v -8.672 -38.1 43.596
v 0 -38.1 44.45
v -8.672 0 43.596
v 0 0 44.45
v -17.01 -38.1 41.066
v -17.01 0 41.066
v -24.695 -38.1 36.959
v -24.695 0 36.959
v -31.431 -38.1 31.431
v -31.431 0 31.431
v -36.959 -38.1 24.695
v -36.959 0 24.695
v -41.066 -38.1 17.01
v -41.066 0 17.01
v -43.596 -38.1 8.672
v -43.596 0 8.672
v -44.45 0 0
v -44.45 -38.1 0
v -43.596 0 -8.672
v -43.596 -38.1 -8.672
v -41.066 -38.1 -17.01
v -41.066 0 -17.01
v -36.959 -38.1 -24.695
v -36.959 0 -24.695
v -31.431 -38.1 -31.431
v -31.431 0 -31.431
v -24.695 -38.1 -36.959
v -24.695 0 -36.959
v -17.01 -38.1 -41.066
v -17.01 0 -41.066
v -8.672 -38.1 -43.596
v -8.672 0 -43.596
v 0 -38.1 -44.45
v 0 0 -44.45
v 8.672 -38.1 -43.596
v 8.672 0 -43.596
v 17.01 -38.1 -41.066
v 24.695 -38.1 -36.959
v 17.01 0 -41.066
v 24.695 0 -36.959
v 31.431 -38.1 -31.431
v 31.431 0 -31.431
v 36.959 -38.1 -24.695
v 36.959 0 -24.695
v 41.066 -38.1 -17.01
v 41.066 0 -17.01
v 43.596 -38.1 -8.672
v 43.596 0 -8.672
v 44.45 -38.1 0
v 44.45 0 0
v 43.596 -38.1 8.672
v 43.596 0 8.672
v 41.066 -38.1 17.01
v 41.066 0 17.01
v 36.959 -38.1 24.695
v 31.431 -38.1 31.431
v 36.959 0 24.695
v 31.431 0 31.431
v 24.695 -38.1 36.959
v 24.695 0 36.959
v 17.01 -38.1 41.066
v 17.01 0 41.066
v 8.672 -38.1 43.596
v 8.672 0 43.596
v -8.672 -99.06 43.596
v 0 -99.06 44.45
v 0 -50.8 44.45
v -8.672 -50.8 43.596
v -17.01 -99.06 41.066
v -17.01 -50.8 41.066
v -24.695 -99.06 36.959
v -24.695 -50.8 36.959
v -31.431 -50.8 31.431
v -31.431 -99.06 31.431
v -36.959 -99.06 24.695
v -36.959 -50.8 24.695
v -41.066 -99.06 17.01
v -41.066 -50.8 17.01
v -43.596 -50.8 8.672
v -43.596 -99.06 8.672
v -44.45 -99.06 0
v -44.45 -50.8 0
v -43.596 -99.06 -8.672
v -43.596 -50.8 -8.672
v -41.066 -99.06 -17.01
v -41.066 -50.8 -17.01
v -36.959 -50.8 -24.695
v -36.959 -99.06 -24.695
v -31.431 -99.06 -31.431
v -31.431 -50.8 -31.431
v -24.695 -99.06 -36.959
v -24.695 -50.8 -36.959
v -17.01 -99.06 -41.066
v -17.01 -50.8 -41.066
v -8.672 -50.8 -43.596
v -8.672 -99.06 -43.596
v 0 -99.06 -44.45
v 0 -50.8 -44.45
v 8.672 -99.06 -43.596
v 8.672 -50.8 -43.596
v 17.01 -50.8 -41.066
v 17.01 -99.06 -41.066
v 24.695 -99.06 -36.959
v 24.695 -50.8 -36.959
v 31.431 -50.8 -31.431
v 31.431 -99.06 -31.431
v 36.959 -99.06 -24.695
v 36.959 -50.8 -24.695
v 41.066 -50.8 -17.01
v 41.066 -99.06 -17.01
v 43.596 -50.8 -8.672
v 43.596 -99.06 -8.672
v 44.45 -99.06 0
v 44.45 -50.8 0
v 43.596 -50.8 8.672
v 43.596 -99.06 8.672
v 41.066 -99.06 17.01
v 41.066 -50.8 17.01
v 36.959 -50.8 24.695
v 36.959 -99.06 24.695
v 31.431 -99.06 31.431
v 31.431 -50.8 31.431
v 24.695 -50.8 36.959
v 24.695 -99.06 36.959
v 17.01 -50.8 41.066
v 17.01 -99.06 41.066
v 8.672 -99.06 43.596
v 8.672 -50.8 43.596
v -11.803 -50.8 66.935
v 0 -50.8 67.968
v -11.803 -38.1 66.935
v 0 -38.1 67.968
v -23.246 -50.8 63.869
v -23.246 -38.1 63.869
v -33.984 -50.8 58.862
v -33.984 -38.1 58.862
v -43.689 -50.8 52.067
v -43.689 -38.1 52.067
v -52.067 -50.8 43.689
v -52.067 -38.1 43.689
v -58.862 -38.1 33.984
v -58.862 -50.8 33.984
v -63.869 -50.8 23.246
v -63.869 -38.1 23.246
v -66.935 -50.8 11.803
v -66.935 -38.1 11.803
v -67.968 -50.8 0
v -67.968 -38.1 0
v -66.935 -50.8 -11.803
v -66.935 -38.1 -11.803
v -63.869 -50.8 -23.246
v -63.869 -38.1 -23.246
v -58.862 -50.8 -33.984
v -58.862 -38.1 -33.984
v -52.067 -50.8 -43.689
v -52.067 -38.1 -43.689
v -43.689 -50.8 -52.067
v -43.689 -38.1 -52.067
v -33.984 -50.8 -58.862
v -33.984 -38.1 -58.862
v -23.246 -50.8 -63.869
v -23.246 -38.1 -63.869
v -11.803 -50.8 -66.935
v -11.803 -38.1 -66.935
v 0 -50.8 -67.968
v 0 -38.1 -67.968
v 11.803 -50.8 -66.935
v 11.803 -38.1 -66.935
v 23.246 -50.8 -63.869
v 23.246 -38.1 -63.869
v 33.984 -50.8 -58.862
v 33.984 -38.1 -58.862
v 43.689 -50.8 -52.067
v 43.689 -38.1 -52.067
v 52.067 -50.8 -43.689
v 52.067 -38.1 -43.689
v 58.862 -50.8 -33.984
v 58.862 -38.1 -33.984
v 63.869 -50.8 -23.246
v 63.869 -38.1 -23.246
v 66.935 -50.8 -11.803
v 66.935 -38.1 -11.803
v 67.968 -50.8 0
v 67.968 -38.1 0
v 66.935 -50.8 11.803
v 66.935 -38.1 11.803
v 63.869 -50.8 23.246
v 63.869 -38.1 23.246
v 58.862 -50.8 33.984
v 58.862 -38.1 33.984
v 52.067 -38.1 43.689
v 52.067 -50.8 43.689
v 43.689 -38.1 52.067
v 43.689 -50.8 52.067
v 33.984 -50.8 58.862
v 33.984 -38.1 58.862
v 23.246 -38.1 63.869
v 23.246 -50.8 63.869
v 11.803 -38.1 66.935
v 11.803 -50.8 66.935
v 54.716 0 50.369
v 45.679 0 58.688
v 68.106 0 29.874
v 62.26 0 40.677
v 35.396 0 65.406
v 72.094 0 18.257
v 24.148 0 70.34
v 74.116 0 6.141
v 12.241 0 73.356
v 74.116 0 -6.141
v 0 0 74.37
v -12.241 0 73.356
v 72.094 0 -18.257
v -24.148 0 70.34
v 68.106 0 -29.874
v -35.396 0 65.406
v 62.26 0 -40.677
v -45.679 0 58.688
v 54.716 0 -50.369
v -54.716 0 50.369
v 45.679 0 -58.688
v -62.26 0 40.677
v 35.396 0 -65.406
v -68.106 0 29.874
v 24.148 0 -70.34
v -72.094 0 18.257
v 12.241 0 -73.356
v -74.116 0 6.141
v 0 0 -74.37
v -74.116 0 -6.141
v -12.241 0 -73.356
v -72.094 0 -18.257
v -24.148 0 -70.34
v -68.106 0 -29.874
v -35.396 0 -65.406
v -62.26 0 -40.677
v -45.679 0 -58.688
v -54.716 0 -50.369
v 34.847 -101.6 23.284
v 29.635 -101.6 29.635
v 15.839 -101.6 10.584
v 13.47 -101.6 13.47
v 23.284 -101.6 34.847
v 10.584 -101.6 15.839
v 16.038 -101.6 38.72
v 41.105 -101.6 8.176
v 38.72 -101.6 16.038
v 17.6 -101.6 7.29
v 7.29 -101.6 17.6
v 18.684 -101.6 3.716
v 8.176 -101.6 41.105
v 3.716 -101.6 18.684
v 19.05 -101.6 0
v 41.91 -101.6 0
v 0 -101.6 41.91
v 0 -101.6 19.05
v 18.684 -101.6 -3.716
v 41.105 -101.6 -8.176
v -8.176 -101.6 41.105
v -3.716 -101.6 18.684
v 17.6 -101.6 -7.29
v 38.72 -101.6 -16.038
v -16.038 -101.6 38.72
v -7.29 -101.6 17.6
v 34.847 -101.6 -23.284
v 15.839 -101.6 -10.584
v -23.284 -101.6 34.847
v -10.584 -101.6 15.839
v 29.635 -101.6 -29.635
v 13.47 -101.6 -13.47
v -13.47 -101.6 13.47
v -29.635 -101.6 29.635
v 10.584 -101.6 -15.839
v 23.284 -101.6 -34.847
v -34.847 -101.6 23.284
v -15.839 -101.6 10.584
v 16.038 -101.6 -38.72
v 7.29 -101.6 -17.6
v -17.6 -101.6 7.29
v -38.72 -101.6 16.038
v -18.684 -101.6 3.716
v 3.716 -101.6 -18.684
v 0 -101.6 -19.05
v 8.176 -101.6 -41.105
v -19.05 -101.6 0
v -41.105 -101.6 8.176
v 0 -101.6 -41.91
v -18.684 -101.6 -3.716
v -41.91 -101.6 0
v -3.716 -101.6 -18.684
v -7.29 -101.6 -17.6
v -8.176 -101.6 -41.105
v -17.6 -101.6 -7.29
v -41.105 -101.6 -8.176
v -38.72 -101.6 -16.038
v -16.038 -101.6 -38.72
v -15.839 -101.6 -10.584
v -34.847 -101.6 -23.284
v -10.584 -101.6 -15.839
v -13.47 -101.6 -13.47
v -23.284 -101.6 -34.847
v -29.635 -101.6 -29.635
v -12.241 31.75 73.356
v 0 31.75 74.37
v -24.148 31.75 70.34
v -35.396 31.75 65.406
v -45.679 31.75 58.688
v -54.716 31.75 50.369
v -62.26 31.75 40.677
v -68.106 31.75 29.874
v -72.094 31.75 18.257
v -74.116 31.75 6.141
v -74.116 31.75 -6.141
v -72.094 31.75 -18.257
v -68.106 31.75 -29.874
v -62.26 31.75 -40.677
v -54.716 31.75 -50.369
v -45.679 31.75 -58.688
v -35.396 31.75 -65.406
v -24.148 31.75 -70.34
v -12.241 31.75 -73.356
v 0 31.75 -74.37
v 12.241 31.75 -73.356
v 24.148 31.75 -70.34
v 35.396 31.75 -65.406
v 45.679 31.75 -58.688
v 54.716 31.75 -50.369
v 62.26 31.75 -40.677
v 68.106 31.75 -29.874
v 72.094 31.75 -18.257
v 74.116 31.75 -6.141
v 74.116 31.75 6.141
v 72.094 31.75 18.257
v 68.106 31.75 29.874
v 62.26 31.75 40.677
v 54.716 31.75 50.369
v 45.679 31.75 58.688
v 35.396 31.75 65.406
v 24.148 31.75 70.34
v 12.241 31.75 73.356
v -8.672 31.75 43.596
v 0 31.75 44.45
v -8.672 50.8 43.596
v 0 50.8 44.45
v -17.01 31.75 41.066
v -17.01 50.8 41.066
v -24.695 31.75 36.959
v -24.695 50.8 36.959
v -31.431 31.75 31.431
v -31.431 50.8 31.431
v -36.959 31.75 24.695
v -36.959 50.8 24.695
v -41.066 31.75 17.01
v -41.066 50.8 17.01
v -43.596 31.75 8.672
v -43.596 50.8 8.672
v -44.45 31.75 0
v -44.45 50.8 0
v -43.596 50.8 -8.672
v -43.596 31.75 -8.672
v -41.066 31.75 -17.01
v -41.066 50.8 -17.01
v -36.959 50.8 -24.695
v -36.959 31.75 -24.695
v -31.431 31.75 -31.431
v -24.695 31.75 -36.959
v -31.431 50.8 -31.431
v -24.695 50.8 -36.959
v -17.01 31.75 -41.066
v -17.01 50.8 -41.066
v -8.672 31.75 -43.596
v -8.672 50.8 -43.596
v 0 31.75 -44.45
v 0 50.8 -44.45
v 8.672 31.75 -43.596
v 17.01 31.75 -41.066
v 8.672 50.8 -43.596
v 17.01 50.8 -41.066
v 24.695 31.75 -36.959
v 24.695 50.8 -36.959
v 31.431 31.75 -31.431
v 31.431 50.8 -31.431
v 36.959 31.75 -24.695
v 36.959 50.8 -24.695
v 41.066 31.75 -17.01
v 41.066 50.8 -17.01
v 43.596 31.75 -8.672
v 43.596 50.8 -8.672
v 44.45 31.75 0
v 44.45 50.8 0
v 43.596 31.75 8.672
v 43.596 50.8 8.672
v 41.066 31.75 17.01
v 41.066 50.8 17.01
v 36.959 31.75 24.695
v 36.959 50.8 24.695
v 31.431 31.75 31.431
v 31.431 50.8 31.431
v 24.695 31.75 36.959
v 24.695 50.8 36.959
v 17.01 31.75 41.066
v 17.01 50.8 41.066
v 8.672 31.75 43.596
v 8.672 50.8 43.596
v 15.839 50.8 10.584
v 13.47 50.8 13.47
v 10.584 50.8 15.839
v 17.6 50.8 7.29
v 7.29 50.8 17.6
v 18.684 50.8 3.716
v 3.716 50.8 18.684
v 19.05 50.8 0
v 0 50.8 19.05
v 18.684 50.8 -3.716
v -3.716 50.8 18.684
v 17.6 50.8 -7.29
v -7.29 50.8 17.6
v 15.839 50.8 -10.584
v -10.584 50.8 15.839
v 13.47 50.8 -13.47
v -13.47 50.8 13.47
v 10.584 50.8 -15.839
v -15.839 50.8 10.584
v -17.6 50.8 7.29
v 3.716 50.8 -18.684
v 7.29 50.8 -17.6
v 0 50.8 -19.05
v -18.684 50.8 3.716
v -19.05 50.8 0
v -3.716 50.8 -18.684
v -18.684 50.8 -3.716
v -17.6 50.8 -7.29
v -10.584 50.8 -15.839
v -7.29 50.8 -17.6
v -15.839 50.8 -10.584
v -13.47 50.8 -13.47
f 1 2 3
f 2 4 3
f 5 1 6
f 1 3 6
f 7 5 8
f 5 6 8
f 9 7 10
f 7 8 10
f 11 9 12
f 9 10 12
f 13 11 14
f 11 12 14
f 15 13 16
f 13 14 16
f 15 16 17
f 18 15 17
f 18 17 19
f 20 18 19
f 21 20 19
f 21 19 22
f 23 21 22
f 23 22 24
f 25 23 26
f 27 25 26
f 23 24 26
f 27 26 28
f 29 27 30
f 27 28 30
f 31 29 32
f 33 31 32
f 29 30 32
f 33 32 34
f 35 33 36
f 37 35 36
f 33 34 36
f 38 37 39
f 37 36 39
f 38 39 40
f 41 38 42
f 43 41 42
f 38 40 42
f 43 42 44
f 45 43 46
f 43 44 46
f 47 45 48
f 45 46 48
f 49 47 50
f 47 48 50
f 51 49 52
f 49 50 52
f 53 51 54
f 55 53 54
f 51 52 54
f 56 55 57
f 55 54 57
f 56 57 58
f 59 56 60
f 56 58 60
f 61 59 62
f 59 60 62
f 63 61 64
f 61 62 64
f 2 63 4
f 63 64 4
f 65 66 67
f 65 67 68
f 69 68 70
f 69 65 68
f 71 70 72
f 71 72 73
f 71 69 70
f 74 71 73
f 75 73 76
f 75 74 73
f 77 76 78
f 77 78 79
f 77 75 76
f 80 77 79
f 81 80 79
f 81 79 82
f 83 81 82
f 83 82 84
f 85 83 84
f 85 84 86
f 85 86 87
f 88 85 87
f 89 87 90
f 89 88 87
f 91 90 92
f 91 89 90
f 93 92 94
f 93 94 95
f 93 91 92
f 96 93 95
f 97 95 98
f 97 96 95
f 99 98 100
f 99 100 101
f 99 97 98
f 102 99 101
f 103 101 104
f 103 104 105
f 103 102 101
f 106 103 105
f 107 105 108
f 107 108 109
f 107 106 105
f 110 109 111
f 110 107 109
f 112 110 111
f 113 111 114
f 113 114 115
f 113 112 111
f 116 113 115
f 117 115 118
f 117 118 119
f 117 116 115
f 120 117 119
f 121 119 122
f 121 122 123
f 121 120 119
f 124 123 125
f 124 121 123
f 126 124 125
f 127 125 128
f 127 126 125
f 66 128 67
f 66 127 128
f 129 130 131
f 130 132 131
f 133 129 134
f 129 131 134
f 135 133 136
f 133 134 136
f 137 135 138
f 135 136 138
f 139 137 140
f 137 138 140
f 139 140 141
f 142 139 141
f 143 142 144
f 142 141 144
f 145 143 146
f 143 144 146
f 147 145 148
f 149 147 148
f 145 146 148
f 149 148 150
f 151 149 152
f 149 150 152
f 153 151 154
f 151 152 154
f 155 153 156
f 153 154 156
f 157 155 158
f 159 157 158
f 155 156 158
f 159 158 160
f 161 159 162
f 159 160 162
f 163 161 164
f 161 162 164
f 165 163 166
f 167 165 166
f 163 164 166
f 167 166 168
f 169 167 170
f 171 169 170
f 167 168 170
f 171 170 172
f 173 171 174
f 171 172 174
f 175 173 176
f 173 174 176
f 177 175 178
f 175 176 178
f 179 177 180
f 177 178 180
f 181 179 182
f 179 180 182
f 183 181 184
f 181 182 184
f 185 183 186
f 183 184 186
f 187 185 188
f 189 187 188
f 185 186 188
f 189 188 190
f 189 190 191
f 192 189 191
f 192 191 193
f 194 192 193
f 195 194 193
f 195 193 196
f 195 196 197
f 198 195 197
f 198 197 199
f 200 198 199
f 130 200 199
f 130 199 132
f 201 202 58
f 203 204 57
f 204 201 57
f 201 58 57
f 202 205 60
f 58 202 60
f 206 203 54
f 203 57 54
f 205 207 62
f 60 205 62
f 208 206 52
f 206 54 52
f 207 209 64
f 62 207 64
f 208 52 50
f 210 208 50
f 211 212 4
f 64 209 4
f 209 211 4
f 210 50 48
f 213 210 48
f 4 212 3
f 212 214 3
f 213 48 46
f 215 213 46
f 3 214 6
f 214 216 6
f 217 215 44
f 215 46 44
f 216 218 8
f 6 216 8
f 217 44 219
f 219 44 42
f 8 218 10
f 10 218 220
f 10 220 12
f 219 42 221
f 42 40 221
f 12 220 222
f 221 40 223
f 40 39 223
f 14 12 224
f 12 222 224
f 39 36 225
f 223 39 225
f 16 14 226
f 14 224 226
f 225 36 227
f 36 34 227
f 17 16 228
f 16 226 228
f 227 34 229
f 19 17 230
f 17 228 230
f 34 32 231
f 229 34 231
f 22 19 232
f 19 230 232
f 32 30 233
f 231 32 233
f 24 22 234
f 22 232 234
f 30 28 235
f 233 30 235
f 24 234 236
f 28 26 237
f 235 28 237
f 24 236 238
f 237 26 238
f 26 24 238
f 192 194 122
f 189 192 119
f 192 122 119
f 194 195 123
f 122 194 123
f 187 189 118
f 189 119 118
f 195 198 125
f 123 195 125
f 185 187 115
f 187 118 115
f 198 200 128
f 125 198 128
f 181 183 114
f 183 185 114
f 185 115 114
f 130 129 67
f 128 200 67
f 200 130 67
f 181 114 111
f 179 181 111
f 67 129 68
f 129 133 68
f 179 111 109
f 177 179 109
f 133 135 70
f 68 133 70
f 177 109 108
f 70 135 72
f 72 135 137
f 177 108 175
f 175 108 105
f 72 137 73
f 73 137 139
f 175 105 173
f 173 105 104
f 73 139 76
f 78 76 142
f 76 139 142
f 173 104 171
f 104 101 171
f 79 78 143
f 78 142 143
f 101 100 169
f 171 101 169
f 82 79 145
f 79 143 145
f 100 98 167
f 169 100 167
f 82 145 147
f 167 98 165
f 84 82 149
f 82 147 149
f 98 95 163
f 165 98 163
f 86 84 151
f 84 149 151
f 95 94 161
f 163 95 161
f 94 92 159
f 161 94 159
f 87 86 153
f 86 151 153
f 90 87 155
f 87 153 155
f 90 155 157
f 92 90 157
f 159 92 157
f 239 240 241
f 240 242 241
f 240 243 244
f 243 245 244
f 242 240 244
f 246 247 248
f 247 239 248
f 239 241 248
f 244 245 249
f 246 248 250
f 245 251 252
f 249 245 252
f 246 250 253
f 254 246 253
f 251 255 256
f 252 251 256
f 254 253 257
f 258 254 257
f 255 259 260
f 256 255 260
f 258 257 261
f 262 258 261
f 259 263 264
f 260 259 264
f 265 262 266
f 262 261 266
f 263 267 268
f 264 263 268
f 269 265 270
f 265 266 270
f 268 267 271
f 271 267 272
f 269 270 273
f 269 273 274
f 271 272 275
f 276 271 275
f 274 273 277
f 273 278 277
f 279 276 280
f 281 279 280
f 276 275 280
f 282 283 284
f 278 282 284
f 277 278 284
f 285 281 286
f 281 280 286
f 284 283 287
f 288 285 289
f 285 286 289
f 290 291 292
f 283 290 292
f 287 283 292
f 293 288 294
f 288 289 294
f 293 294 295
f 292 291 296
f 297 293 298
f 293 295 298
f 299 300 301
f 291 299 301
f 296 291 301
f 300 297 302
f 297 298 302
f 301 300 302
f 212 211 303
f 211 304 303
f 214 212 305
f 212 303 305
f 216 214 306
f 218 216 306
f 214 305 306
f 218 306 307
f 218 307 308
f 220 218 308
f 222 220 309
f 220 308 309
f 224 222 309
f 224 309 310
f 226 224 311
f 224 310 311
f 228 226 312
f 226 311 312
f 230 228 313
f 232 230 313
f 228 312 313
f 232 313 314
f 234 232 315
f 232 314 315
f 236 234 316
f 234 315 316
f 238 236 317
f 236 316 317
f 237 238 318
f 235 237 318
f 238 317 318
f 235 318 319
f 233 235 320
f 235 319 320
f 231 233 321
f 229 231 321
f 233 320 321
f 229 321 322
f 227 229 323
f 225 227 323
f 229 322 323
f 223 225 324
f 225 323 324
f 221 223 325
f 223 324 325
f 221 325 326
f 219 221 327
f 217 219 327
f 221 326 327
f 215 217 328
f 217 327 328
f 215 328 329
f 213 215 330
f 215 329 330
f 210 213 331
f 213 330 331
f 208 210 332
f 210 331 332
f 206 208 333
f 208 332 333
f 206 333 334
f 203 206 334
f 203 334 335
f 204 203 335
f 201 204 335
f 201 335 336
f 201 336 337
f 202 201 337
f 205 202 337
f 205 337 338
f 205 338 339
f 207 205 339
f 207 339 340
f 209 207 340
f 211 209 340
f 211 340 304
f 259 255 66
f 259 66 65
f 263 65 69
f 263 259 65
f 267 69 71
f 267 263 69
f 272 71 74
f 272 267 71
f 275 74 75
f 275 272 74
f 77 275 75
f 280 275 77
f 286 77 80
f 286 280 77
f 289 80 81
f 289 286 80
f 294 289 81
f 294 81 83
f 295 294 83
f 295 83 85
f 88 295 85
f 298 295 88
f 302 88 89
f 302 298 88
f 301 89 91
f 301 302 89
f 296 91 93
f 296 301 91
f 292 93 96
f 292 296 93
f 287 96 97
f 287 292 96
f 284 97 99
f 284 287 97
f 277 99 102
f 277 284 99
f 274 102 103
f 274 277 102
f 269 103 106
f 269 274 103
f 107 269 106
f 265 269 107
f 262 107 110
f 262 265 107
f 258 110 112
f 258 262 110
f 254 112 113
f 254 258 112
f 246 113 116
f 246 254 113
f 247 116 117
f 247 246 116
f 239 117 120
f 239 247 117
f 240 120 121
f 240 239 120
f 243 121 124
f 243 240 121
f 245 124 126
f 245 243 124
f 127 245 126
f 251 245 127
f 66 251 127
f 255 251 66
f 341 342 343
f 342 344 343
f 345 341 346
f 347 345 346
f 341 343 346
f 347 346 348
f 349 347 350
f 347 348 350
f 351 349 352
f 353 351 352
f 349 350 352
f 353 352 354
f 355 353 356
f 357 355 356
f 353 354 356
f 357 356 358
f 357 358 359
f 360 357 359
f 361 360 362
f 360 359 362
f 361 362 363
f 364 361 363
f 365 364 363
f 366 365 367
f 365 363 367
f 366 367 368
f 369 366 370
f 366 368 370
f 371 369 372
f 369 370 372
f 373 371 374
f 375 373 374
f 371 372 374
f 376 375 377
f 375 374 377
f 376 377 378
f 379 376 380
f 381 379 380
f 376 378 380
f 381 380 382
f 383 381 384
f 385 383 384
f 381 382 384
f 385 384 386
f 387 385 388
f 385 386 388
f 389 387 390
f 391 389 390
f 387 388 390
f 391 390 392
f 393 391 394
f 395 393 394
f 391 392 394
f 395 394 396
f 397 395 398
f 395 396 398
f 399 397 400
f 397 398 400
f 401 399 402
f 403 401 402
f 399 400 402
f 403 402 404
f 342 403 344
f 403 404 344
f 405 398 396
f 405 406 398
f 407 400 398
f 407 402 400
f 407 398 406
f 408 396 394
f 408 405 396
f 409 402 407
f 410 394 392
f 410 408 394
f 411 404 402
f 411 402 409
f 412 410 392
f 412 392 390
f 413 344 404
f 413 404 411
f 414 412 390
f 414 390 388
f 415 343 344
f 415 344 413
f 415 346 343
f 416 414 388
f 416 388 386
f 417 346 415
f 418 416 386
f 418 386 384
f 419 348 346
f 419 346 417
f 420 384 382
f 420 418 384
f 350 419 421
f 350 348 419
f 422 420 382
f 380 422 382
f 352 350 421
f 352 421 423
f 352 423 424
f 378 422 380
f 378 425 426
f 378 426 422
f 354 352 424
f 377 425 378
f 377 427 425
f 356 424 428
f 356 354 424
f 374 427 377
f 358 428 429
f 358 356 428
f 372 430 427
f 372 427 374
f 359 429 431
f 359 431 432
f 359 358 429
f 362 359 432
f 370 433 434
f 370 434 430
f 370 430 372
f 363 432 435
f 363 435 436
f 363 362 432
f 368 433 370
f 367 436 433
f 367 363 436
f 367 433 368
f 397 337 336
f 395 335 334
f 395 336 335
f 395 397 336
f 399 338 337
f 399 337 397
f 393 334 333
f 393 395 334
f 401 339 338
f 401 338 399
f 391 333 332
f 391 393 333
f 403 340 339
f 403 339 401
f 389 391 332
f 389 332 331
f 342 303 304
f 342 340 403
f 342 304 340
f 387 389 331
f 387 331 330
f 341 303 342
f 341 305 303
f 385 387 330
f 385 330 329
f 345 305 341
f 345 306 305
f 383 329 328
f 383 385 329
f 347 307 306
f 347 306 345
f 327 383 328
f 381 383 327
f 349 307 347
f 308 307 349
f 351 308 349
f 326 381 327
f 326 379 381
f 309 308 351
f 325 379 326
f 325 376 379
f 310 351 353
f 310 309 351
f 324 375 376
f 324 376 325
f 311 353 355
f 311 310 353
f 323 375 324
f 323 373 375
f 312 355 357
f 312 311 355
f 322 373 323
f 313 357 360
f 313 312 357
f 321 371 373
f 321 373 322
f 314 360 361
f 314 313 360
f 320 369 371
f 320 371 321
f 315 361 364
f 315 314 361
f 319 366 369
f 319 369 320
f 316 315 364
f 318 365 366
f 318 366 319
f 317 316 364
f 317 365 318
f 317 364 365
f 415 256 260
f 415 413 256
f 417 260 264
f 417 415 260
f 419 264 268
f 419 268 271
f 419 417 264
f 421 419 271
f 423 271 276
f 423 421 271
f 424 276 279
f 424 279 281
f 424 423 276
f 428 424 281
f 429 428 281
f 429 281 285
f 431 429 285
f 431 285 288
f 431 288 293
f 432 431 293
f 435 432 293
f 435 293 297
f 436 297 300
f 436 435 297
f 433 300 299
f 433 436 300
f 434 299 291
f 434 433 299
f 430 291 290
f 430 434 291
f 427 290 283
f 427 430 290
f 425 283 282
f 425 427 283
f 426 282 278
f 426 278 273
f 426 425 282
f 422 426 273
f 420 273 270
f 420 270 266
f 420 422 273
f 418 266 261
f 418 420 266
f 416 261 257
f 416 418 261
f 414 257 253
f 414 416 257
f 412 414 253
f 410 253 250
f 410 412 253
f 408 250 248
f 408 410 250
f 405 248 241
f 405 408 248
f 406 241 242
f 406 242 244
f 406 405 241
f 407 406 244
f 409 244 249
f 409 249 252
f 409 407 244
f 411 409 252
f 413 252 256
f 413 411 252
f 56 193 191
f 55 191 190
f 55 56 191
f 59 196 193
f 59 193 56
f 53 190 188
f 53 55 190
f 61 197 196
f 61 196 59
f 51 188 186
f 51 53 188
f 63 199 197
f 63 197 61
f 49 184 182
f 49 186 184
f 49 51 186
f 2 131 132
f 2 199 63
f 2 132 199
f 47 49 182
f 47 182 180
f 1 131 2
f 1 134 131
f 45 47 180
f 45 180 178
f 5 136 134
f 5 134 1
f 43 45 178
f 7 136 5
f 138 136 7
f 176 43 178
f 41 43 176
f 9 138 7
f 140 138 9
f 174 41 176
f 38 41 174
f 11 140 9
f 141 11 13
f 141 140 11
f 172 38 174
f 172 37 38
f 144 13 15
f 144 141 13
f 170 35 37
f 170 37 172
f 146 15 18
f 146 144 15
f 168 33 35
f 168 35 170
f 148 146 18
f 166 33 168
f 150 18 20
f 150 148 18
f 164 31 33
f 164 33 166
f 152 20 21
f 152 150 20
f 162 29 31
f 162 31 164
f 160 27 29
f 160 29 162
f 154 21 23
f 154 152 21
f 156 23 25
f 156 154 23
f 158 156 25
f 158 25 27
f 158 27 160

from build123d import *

# Parameters (mm, degrees)
F0_W    = 12.7
F0_H    = 25.4
F0_W_2  = 50.8
F0_W_3  = 19.05
F0_W_4  = 31.75
F0_H_2  = 29.9200265884
F0_H_3  = 23.518068409
F0_W_5  = 38.1
F2_SIZE = 2.54


with BuildPart() as f1:
    # F0 (on Right) → F1 (revolve)
    with BuildSketch(Plane.YZ):
        with Locations((-44.45, 31.75)):
            Rectangle(F0_W, F0_H)
        with Locations((-76.2, 31.75)):
            Rectangle(F0_W_2, F0_H)
        with Locations((41.275, 31.75)):
            Rectangle(F0_W_3, F0_H)
        with Locations((15.875, 59.4100132942)):
            Rectangle(F0_W_4, F0_H_2)
        with Locations((-44.45, 56.2090342045)):
            Rectangle(F0_W, F0_H_3)
        with Locations((-19.05, 31.75)):
            Rectangle(F0_W_5, F0_H)
        with Locations((15.875, 31.75)):
            Rectangle(F0_W_4, F0_H)
    revolve(axis=Axis((0, -50.8, 0), (0, -1, 0)))

    # F2
    f2_edges = [f1.edges().sort_by_distance(p)[0] for p in [
        (0, -101.6, -44.45),
    ]]
    chamfer(f2_edges, length=F2_SIZE)


solid = f1.part
